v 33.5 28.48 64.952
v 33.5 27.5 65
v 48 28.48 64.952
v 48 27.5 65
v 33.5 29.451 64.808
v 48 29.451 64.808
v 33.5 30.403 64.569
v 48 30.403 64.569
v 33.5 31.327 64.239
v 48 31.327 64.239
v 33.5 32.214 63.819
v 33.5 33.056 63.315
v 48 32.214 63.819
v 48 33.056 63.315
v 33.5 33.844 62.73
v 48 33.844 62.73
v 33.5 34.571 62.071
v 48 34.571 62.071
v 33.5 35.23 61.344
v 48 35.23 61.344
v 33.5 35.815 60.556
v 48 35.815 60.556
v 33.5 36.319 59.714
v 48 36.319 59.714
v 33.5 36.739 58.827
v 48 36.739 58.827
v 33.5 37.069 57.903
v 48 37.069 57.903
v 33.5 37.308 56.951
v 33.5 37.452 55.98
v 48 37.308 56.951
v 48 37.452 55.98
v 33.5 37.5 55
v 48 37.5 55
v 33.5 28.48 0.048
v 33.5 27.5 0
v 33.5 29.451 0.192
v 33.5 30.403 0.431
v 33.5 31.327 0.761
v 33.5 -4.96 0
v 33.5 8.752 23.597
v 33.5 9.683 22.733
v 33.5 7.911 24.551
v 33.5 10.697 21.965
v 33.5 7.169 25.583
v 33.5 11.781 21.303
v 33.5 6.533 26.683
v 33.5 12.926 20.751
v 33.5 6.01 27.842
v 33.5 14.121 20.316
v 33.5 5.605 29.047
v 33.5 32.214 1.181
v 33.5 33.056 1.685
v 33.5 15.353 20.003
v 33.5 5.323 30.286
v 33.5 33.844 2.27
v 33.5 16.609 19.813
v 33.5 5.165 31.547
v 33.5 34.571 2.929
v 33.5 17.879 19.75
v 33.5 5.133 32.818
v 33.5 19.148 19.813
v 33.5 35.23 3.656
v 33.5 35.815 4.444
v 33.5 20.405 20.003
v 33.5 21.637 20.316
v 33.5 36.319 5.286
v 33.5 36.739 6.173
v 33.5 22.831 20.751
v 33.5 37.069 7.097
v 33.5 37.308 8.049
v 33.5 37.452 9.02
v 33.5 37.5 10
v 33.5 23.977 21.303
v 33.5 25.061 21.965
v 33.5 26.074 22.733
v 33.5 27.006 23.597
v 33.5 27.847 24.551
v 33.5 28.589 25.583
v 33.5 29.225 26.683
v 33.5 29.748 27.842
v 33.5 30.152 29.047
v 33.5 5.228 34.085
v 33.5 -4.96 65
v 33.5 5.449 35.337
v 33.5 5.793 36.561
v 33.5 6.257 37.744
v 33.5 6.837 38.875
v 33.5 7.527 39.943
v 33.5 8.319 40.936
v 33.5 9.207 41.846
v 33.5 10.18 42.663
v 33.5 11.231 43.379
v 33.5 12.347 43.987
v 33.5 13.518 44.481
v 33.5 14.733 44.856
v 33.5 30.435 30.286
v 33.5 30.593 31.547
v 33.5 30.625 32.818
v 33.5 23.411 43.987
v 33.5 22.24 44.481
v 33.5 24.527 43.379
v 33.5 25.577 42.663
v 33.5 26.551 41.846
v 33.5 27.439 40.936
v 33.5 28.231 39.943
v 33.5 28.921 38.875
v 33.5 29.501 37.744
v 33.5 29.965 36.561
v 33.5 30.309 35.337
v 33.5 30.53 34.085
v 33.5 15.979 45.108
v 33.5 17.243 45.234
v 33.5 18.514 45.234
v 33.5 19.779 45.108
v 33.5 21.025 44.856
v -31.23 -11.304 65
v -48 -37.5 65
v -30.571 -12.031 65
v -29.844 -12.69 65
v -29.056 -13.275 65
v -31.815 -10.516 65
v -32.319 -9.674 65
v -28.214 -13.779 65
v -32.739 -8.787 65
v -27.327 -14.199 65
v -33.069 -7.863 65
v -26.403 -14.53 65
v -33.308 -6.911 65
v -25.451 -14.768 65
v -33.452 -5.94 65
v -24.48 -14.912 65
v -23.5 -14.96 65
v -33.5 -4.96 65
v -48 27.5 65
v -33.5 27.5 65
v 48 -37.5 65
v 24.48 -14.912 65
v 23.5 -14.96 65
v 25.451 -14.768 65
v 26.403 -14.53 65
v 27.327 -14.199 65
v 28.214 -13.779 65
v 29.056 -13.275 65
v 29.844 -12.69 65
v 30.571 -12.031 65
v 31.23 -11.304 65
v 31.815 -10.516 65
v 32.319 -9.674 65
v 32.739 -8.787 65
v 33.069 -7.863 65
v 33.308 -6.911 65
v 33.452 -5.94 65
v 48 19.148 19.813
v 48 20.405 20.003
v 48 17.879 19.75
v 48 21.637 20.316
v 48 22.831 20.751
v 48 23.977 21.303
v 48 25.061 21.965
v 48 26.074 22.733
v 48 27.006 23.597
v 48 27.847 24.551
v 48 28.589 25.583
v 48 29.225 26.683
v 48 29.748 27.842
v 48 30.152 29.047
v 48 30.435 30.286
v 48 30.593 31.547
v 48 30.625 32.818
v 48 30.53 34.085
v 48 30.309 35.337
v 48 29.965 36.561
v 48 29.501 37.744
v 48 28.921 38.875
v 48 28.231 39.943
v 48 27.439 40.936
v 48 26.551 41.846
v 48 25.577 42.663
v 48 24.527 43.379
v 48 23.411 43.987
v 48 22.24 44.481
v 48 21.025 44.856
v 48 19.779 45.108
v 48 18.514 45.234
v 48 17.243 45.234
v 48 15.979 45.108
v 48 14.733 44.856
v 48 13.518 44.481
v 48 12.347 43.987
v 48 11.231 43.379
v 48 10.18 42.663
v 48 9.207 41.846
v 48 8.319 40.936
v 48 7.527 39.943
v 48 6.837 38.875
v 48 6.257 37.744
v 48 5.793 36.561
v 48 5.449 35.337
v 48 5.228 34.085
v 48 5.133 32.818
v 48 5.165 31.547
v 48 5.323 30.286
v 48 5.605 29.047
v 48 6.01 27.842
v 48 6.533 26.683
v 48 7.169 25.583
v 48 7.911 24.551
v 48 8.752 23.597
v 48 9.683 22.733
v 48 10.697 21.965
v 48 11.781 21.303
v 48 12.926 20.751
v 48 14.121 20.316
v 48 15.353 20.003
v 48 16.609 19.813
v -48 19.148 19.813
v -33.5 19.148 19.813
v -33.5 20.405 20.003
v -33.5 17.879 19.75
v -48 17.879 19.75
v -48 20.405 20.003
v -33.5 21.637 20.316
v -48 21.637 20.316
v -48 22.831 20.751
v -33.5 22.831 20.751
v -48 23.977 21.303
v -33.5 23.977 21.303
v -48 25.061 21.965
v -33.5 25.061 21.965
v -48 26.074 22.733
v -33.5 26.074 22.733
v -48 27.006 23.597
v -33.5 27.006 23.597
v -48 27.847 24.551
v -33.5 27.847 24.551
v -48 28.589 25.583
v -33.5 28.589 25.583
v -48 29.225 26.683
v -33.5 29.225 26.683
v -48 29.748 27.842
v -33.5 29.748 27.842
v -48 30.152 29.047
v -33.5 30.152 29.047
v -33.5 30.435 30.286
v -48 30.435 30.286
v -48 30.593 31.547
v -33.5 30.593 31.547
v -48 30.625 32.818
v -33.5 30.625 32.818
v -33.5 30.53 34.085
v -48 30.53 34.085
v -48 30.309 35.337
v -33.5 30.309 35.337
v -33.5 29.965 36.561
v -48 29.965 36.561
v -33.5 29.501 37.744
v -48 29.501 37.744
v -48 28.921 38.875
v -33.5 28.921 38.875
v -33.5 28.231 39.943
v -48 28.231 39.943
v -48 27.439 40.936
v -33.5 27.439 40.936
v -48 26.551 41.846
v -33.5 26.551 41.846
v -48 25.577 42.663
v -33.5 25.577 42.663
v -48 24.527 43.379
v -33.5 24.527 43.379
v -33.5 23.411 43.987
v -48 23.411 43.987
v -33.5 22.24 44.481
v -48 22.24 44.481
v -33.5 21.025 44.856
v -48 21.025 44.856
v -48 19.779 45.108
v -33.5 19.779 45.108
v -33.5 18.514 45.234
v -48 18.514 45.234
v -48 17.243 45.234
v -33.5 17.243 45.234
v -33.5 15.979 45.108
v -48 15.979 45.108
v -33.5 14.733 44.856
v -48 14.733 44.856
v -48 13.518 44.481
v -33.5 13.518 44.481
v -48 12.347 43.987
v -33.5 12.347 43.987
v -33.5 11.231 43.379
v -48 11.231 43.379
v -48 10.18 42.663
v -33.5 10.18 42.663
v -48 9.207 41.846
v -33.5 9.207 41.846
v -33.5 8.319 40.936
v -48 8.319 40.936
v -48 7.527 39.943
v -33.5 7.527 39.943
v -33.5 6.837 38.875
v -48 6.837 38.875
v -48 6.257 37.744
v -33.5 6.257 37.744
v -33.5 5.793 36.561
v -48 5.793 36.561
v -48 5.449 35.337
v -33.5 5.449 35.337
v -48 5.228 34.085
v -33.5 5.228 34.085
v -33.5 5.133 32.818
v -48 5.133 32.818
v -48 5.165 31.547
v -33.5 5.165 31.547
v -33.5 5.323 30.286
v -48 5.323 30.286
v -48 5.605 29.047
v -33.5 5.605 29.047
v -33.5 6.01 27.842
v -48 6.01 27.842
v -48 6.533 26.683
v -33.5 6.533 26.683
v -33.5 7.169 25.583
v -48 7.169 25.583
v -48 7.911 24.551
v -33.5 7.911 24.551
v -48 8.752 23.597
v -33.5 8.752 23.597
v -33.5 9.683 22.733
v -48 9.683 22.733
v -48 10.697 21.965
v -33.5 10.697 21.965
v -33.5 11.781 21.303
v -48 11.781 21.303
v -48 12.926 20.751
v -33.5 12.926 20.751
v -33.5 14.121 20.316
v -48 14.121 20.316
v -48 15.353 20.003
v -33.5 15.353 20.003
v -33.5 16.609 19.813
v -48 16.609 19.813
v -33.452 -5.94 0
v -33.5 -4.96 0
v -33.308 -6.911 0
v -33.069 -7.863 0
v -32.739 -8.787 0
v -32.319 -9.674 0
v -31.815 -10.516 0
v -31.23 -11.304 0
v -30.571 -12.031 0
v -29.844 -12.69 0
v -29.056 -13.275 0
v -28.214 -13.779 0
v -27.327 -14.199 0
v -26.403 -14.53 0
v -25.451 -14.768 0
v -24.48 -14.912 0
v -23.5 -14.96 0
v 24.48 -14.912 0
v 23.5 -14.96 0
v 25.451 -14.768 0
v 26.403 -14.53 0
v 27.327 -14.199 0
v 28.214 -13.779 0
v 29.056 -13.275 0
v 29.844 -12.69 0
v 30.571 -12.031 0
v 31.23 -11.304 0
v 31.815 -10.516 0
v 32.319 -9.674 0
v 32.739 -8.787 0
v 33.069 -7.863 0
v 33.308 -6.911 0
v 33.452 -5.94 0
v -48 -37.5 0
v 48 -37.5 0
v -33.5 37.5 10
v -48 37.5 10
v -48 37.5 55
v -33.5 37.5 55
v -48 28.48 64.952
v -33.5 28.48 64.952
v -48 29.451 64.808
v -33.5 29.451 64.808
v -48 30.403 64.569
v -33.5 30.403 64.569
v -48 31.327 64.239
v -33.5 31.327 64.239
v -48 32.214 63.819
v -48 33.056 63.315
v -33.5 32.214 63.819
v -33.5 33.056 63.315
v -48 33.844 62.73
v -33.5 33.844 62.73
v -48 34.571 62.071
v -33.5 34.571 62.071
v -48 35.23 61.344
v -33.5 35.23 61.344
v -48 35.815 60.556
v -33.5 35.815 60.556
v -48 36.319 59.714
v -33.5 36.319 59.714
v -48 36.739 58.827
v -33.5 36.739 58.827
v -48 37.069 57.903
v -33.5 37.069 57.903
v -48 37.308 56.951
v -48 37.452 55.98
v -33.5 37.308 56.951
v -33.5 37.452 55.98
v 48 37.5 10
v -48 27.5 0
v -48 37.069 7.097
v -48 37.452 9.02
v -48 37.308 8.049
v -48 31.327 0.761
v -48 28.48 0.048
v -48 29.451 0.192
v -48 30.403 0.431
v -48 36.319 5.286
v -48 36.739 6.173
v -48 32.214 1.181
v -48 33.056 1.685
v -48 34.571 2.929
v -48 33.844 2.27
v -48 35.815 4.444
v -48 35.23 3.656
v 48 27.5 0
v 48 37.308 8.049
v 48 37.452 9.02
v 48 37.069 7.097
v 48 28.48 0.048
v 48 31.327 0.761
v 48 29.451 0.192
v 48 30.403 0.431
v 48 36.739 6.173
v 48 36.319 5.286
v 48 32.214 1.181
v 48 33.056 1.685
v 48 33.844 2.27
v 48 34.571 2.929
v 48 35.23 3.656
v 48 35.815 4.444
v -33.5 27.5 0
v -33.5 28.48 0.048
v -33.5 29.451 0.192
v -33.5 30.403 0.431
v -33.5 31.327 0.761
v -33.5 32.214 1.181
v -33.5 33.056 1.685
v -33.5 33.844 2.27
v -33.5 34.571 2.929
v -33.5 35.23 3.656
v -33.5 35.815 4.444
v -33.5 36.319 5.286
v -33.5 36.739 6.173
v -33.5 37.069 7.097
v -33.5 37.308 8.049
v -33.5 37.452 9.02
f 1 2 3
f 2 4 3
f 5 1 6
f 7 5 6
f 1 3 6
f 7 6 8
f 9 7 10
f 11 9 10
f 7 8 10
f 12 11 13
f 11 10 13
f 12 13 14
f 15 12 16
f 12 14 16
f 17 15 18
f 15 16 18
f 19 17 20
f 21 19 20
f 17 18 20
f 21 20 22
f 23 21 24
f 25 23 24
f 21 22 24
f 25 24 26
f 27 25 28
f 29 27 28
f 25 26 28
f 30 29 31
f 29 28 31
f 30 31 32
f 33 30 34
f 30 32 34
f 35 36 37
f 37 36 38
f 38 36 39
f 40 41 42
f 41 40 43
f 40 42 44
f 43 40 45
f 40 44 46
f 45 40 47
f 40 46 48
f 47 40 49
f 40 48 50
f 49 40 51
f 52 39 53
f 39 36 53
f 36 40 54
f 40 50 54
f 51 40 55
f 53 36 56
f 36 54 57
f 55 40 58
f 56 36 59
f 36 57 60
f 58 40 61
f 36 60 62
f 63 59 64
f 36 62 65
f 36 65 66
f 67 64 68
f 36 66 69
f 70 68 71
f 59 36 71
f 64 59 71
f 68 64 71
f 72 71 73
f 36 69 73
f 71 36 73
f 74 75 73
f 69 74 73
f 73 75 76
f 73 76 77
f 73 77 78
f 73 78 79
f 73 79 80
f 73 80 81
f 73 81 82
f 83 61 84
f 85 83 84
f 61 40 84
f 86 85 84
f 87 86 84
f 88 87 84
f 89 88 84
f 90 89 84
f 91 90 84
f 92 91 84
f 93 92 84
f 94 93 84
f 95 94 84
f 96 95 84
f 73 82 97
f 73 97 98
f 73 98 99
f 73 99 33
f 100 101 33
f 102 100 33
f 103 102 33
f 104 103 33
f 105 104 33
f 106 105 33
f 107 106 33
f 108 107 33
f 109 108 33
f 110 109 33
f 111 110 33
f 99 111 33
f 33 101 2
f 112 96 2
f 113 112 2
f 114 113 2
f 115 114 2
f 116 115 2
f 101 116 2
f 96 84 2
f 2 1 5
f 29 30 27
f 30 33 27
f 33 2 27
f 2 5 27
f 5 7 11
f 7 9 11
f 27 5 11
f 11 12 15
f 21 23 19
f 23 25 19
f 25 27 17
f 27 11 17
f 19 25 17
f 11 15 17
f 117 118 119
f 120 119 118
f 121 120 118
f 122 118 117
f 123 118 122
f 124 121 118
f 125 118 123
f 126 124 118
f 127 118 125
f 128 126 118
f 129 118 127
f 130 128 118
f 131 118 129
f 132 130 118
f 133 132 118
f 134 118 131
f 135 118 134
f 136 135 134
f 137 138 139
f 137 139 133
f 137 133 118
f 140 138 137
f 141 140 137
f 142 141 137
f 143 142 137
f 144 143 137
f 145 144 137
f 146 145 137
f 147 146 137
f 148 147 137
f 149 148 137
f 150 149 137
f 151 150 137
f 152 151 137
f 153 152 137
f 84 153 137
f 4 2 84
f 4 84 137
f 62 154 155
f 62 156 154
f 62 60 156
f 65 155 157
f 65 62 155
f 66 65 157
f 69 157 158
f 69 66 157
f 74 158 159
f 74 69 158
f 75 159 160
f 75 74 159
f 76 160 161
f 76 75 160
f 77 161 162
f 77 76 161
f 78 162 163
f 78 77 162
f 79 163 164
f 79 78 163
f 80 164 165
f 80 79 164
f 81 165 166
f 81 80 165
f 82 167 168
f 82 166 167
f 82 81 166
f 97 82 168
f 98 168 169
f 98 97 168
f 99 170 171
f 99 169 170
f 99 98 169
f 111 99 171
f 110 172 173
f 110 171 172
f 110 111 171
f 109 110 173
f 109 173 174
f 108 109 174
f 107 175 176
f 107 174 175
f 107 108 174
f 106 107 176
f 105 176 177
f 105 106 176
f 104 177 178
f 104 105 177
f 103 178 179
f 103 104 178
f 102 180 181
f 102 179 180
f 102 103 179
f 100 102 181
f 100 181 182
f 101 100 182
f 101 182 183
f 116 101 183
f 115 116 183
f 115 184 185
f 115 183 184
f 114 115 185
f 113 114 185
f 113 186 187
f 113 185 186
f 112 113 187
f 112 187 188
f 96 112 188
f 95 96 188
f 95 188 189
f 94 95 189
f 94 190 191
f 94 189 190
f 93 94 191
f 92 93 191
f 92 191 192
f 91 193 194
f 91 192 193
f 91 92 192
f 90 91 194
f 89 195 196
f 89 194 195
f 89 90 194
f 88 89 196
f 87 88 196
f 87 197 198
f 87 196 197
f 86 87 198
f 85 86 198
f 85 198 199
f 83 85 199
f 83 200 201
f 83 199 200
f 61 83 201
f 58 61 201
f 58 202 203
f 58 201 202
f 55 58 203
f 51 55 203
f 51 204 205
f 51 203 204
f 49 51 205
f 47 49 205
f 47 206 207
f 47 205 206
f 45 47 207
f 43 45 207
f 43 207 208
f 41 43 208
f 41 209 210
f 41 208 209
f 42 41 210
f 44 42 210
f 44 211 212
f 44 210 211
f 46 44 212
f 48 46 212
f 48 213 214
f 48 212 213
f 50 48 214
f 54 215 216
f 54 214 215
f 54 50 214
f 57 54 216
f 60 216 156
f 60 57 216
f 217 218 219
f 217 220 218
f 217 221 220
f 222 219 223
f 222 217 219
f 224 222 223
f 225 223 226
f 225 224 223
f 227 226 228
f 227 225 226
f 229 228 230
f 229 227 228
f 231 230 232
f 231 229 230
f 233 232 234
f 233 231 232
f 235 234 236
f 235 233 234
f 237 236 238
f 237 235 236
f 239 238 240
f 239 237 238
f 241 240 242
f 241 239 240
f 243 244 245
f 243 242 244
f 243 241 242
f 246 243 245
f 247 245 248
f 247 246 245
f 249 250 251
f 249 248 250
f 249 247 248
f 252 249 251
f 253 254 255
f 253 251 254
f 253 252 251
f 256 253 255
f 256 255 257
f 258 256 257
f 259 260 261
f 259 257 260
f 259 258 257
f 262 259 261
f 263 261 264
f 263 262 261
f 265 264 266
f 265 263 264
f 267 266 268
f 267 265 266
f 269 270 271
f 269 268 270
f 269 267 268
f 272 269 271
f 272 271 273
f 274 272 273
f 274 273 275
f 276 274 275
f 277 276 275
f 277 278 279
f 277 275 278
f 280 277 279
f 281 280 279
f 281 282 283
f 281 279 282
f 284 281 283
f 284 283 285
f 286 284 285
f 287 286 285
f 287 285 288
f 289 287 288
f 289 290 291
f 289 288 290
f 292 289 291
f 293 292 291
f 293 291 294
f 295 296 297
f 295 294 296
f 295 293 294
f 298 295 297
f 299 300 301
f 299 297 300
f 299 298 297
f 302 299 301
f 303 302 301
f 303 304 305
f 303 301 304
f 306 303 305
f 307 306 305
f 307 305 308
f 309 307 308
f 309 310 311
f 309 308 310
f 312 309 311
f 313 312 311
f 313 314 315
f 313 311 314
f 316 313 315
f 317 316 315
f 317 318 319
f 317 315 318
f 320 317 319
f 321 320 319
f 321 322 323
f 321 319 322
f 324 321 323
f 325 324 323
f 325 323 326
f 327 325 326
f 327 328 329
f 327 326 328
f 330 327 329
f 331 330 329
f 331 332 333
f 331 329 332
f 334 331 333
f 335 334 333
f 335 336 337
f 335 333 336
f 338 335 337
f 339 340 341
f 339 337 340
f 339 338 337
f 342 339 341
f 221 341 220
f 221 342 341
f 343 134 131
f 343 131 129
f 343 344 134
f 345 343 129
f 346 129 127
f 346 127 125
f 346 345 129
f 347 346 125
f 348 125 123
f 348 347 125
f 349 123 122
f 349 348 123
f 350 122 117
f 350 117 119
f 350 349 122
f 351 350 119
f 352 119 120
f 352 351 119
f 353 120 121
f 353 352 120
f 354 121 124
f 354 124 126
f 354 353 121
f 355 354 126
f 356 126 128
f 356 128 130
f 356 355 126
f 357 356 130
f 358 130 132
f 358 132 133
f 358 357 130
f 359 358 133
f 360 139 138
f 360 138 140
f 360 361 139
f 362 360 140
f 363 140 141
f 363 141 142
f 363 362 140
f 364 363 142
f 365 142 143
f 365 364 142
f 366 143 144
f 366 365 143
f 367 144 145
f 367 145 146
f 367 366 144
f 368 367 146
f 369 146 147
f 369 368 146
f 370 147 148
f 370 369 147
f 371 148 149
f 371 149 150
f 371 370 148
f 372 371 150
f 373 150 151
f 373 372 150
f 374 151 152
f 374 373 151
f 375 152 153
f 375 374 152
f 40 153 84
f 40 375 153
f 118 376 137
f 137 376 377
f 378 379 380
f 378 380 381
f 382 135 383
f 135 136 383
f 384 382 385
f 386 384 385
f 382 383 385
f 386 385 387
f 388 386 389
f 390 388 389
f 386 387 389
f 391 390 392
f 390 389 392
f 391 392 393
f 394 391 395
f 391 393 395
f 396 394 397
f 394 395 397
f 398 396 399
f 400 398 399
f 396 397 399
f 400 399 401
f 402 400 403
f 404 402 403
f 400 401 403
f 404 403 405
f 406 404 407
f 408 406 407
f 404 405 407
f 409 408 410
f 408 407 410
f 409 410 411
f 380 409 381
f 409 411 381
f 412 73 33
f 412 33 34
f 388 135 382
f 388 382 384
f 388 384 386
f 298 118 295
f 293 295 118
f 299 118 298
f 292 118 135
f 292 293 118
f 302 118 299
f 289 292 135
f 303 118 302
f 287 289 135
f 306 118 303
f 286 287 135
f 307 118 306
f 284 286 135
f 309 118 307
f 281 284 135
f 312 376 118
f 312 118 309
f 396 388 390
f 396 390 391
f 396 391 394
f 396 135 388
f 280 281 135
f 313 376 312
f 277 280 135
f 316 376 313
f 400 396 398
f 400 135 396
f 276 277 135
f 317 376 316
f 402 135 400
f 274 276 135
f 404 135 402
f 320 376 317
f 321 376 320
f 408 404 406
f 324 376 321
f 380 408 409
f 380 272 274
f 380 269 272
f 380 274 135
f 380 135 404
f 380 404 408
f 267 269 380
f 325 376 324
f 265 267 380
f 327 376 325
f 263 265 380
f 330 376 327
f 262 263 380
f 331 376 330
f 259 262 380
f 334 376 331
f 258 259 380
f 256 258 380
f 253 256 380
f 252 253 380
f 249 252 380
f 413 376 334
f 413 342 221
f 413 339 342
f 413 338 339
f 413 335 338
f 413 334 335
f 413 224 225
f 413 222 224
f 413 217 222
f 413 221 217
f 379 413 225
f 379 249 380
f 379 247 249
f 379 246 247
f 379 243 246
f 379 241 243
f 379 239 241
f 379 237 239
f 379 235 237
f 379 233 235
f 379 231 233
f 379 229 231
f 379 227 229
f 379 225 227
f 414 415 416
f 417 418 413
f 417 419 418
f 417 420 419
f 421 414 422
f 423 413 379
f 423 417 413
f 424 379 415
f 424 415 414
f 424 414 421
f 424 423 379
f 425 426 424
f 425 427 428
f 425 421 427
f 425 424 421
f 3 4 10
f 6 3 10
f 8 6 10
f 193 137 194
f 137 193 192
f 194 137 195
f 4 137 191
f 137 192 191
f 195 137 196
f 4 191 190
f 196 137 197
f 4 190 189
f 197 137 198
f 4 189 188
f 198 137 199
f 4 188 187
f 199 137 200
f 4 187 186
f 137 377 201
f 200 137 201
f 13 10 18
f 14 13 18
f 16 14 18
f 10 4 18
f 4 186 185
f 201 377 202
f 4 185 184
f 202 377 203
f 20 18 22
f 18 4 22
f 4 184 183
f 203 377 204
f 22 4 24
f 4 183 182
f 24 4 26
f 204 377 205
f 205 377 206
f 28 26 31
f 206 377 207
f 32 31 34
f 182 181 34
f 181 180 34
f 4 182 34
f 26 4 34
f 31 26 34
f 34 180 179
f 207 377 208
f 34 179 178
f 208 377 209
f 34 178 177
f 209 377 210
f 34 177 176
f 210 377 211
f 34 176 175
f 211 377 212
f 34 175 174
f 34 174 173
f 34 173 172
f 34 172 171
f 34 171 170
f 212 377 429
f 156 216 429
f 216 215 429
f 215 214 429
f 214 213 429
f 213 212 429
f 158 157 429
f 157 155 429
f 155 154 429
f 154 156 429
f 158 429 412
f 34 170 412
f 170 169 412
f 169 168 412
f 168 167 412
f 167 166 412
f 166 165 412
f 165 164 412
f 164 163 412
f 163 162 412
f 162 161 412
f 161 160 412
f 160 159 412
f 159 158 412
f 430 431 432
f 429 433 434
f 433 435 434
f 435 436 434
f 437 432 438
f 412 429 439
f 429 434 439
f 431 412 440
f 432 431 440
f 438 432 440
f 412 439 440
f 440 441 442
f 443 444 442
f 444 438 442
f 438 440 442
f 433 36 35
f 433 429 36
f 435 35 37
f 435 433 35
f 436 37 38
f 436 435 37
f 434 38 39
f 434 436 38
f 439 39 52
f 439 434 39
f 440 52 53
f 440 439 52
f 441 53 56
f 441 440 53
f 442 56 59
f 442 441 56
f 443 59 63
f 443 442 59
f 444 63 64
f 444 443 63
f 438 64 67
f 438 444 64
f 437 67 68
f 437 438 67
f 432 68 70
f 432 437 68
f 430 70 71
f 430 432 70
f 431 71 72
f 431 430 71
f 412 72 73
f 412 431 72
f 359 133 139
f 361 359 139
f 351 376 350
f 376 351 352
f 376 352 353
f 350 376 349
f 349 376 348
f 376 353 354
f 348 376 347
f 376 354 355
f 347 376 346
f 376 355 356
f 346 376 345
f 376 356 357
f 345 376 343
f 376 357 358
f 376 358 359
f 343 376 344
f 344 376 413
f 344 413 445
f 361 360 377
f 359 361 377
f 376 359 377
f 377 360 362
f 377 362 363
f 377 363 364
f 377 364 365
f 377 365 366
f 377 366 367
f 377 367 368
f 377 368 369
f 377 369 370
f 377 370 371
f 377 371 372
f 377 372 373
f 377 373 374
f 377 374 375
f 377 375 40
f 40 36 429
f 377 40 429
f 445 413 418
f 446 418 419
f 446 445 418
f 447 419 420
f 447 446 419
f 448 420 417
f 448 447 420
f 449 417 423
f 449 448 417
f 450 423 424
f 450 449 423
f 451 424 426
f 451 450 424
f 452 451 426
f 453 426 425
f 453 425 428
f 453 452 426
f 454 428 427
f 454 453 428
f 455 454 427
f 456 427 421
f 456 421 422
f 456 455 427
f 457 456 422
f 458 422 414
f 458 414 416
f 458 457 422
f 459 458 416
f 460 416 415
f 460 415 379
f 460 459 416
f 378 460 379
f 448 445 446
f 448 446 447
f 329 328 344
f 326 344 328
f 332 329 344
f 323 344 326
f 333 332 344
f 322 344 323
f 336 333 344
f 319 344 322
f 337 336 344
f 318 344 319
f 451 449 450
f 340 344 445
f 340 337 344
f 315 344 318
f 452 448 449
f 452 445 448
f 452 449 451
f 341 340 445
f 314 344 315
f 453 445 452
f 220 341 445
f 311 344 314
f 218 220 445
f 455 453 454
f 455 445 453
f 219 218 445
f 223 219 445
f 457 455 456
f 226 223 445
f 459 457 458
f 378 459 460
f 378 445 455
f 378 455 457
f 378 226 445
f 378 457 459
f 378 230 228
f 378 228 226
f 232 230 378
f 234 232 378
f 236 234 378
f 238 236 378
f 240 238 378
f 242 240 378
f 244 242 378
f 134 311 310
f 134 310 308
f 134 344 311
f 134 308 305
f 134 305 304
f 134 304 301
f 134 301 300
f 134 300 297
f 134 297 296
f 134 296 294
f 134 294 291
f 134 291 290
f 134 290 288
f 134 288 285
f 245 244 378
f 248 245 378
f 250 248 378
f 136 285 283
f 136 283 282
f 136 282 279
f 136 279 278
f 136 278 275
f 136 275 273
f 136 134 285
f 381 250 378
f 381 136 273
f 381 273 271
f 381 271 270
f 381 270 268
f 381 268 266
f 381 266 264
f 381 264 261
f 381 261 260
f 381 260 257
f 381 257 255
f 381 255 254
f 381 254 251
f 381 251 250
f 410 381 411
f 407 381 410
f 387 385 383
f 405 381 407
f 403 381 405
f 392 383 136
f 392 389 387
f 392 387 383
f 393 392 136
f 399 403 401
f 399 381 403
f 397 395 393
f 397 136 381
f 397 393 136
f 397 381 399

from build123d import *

# Parameters (mm, degrees)
SKETCH1_W               = 96
SKETCH1_H               = 75
BOSS_EXTRUDE1_DEPTH     = 65
SKETCH2_W               = 67
SKETCH2_H               = 104.92040837
CUT_EXTRUDE1_DEPTH      = 90.080020207
CUT_EXTRUDE2_DEPTH      = 111.785829419
CUT_EXTRUDE2_DEPTH_BACK = 111.785829419
SKETCH3_R               = 12.75
FILLET1_R               = 10


with BuildPart() as part:
    # Sketch1 → Boss-Extrude1 (new body)
    with BuildSketch(Plane.XY):
        Rectangle(SKETCH1_W, SKETCH1_H)
    extrude(amount=BOSS_EXTRUDE1_DEPTH)

    # Sketch2 → Cut-Extrude1 (cut, through all)
    with BuildSketch(Plane.XY.offset(65)):
        with Locations((0, 37.5)):
            Rectangle(SKETCH2_W, SKETCH2_H)
    extrude(amount=-CUT_EXTRUDE1_DEPTH, mode=Mode.SUBTRACT)

    # Sketch3 → Cut-Extrude2 (cut, two sides: drawn at the far end of the back side and taken through both)
    with BuildSketch(Plane(origin=(-33.5, 0, 0), x_dir=(0, 0, -1), z_dir=(1, 0, 0)).offset(-CUT_EXTRUDE2_DEPTH_BACK)):
        with Locations((-32.5, 17.878893252)):
            Circle(SKETCH3_R)
    extrude(amount=CUT_EXTRUDE2_DEPTH + CUT_EXTRUDE2_DEPTH_BACK, mode=Mode.SUBTRACT)

    # Fillet1
    fillet1_edges = [part.edges().sort_by_distance(p)[0] for p in [
        (-40.75, 37.5, 0),
        (-40.75, 37.5, 65),
        (-33.5, -14.960204185, 32.5),
        (33.5, -14.960204185, 32.5),
        (40.75, 37.5, 0),
        (40.75, 37.5, 65),
    ]]
    fillet(fillet1_edges, radius=FILLET1_R)


solid = part.part
